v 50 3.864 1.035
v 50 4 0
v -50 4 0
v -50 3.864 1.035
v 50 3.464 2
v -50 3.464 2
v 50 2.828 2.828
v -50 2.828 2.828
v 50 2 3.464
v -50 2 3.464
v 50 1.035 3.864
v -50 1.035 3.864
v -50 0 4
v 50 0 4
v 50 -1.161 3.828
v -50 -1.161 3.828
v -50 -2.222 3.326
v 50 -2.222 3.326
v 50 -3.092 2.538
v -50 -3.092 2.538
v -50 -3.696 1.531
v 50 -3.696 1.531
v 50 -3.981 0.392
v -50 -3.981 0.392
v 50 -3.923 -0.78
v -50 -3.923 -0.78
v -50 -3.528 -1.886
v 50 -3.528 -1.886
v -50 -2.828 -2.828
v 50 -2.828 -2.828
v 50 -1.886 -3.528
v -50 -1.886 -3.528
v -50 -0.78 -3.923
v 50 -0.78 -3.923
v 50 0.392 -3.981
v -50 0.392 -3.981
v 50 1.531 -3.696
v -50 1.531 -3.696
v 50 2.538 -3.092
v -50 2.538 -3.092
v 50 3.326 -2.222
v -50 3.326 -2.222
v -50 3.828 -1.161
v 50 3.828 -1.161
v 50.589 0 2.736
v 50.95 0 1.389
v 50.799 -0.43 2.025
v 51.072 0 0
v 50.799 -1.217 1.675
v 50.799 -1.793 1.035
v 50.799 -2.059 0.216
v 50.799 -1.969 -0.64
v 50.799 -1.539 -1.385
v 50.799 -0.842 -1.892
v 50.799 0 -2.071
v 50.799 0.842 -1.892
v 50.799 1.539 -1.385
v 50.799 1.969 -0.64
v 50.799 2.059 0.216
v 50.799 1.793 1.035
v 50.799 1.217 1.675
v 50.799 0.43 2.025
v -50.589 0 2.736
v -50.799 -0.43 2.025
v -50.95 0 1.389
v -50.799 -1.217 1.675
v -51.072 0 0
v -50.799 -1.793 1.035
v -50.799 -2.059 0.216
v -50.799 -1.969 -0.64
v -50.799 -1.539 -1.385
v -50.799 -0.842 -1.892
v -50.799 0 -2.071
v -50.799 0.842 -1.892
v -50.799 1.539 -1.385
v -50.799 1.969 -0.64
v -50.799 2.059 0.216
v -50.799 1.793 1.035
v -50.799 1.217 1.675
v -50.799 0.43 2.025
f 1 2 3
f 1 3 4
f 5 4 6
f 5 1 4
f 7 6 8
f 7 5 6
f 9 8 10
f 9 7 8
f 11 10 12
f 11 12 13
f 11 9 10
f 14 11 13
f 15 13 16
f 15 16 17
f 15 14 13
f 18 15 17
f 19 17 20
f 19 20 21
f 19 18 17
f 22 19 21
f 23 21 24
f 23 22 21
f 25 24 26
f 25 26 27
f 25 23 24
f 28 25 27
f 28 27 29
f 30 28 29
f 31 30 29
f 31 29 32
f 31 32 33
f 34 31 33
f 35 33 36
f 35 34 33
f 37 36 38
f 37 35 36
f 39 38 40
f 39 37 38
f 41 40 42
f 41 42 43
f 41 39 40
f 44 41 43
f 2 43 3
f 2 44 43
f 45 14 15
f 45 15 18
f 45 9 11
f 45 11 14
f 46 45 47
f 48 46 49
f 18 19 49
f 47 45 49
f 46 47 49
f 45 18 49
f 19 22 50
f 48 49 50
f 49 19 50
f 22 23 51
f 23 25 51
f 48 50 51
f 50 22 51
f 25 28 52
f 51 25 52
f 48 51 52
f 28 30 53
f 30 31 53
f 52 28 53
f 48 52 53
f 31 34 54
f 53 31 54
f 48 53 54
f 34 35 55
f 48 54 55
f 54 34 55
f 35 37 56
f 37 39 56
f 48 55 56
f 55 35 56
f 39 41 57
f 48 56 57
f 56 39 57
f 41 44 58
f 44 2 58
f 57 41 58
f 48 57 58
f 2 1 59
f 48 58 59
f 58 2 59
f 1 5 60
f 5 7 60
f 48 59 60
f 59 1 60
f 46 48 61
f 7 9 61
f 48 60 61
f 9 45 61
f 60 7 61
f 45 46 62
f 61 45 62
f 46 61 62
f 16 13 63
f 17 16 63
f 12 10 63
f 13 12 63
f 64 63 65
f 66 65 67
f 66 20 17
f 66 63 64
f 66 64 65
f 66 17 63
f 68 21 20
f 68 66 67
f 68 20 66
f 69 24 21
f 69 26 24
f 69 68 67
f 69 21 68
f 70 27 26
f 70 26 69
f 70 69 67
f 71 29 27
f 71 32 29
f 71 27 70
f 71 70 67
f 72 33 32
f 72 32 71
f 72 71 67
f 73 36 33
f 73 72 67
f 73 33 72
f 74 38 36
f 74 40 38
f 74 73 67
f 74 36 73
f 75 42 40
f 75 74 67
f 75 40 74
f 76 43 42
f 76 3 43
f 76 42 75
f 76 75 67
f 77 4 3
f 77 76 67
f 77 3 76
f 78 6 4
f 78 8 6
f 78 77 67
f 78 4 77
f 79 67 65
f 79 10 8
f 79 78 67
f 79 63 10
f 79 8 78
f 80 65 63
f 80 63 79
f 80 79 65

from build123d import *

# Parameters (mm, degrees)
F0_R     = 4
F1_DEPTH = 50


# Not quite as in the source:
# - a pattern or mirror of a feature is missing from the dataset's text; its kind, count and spacing are read off the source's solid


with BuildPart() as f1:
    # F0 (on Right) → F1 (new body, symmetric)
    with BuildSketch(Plane.YZ):
        Circle(F0_R)
    extrude(amount=F1_DEPTH, both=True)

    # F2 (on Front) → F3 (revolve)
    with BuildSketch(Plane.XZ):
        with BuildLine():
            ThreePointArc((51.0717967697, 0), (50.79920338, 2.0705523608), (50, 4))
            Line((50, 4), (50, 0))
            Line((50, 0), (51.0717967697, 0))
        make_face()
    f3 = revolve(axis=Axis((0, 0, 0), (1, 0, 0)))

    # F3_copies: F3 across plane
    add(f3.mirror(Plane(origin=(0, 0, 0), x_dir=(0, 0, -1), z_dir=(-1, 0, 0))))


solid = f1.part
